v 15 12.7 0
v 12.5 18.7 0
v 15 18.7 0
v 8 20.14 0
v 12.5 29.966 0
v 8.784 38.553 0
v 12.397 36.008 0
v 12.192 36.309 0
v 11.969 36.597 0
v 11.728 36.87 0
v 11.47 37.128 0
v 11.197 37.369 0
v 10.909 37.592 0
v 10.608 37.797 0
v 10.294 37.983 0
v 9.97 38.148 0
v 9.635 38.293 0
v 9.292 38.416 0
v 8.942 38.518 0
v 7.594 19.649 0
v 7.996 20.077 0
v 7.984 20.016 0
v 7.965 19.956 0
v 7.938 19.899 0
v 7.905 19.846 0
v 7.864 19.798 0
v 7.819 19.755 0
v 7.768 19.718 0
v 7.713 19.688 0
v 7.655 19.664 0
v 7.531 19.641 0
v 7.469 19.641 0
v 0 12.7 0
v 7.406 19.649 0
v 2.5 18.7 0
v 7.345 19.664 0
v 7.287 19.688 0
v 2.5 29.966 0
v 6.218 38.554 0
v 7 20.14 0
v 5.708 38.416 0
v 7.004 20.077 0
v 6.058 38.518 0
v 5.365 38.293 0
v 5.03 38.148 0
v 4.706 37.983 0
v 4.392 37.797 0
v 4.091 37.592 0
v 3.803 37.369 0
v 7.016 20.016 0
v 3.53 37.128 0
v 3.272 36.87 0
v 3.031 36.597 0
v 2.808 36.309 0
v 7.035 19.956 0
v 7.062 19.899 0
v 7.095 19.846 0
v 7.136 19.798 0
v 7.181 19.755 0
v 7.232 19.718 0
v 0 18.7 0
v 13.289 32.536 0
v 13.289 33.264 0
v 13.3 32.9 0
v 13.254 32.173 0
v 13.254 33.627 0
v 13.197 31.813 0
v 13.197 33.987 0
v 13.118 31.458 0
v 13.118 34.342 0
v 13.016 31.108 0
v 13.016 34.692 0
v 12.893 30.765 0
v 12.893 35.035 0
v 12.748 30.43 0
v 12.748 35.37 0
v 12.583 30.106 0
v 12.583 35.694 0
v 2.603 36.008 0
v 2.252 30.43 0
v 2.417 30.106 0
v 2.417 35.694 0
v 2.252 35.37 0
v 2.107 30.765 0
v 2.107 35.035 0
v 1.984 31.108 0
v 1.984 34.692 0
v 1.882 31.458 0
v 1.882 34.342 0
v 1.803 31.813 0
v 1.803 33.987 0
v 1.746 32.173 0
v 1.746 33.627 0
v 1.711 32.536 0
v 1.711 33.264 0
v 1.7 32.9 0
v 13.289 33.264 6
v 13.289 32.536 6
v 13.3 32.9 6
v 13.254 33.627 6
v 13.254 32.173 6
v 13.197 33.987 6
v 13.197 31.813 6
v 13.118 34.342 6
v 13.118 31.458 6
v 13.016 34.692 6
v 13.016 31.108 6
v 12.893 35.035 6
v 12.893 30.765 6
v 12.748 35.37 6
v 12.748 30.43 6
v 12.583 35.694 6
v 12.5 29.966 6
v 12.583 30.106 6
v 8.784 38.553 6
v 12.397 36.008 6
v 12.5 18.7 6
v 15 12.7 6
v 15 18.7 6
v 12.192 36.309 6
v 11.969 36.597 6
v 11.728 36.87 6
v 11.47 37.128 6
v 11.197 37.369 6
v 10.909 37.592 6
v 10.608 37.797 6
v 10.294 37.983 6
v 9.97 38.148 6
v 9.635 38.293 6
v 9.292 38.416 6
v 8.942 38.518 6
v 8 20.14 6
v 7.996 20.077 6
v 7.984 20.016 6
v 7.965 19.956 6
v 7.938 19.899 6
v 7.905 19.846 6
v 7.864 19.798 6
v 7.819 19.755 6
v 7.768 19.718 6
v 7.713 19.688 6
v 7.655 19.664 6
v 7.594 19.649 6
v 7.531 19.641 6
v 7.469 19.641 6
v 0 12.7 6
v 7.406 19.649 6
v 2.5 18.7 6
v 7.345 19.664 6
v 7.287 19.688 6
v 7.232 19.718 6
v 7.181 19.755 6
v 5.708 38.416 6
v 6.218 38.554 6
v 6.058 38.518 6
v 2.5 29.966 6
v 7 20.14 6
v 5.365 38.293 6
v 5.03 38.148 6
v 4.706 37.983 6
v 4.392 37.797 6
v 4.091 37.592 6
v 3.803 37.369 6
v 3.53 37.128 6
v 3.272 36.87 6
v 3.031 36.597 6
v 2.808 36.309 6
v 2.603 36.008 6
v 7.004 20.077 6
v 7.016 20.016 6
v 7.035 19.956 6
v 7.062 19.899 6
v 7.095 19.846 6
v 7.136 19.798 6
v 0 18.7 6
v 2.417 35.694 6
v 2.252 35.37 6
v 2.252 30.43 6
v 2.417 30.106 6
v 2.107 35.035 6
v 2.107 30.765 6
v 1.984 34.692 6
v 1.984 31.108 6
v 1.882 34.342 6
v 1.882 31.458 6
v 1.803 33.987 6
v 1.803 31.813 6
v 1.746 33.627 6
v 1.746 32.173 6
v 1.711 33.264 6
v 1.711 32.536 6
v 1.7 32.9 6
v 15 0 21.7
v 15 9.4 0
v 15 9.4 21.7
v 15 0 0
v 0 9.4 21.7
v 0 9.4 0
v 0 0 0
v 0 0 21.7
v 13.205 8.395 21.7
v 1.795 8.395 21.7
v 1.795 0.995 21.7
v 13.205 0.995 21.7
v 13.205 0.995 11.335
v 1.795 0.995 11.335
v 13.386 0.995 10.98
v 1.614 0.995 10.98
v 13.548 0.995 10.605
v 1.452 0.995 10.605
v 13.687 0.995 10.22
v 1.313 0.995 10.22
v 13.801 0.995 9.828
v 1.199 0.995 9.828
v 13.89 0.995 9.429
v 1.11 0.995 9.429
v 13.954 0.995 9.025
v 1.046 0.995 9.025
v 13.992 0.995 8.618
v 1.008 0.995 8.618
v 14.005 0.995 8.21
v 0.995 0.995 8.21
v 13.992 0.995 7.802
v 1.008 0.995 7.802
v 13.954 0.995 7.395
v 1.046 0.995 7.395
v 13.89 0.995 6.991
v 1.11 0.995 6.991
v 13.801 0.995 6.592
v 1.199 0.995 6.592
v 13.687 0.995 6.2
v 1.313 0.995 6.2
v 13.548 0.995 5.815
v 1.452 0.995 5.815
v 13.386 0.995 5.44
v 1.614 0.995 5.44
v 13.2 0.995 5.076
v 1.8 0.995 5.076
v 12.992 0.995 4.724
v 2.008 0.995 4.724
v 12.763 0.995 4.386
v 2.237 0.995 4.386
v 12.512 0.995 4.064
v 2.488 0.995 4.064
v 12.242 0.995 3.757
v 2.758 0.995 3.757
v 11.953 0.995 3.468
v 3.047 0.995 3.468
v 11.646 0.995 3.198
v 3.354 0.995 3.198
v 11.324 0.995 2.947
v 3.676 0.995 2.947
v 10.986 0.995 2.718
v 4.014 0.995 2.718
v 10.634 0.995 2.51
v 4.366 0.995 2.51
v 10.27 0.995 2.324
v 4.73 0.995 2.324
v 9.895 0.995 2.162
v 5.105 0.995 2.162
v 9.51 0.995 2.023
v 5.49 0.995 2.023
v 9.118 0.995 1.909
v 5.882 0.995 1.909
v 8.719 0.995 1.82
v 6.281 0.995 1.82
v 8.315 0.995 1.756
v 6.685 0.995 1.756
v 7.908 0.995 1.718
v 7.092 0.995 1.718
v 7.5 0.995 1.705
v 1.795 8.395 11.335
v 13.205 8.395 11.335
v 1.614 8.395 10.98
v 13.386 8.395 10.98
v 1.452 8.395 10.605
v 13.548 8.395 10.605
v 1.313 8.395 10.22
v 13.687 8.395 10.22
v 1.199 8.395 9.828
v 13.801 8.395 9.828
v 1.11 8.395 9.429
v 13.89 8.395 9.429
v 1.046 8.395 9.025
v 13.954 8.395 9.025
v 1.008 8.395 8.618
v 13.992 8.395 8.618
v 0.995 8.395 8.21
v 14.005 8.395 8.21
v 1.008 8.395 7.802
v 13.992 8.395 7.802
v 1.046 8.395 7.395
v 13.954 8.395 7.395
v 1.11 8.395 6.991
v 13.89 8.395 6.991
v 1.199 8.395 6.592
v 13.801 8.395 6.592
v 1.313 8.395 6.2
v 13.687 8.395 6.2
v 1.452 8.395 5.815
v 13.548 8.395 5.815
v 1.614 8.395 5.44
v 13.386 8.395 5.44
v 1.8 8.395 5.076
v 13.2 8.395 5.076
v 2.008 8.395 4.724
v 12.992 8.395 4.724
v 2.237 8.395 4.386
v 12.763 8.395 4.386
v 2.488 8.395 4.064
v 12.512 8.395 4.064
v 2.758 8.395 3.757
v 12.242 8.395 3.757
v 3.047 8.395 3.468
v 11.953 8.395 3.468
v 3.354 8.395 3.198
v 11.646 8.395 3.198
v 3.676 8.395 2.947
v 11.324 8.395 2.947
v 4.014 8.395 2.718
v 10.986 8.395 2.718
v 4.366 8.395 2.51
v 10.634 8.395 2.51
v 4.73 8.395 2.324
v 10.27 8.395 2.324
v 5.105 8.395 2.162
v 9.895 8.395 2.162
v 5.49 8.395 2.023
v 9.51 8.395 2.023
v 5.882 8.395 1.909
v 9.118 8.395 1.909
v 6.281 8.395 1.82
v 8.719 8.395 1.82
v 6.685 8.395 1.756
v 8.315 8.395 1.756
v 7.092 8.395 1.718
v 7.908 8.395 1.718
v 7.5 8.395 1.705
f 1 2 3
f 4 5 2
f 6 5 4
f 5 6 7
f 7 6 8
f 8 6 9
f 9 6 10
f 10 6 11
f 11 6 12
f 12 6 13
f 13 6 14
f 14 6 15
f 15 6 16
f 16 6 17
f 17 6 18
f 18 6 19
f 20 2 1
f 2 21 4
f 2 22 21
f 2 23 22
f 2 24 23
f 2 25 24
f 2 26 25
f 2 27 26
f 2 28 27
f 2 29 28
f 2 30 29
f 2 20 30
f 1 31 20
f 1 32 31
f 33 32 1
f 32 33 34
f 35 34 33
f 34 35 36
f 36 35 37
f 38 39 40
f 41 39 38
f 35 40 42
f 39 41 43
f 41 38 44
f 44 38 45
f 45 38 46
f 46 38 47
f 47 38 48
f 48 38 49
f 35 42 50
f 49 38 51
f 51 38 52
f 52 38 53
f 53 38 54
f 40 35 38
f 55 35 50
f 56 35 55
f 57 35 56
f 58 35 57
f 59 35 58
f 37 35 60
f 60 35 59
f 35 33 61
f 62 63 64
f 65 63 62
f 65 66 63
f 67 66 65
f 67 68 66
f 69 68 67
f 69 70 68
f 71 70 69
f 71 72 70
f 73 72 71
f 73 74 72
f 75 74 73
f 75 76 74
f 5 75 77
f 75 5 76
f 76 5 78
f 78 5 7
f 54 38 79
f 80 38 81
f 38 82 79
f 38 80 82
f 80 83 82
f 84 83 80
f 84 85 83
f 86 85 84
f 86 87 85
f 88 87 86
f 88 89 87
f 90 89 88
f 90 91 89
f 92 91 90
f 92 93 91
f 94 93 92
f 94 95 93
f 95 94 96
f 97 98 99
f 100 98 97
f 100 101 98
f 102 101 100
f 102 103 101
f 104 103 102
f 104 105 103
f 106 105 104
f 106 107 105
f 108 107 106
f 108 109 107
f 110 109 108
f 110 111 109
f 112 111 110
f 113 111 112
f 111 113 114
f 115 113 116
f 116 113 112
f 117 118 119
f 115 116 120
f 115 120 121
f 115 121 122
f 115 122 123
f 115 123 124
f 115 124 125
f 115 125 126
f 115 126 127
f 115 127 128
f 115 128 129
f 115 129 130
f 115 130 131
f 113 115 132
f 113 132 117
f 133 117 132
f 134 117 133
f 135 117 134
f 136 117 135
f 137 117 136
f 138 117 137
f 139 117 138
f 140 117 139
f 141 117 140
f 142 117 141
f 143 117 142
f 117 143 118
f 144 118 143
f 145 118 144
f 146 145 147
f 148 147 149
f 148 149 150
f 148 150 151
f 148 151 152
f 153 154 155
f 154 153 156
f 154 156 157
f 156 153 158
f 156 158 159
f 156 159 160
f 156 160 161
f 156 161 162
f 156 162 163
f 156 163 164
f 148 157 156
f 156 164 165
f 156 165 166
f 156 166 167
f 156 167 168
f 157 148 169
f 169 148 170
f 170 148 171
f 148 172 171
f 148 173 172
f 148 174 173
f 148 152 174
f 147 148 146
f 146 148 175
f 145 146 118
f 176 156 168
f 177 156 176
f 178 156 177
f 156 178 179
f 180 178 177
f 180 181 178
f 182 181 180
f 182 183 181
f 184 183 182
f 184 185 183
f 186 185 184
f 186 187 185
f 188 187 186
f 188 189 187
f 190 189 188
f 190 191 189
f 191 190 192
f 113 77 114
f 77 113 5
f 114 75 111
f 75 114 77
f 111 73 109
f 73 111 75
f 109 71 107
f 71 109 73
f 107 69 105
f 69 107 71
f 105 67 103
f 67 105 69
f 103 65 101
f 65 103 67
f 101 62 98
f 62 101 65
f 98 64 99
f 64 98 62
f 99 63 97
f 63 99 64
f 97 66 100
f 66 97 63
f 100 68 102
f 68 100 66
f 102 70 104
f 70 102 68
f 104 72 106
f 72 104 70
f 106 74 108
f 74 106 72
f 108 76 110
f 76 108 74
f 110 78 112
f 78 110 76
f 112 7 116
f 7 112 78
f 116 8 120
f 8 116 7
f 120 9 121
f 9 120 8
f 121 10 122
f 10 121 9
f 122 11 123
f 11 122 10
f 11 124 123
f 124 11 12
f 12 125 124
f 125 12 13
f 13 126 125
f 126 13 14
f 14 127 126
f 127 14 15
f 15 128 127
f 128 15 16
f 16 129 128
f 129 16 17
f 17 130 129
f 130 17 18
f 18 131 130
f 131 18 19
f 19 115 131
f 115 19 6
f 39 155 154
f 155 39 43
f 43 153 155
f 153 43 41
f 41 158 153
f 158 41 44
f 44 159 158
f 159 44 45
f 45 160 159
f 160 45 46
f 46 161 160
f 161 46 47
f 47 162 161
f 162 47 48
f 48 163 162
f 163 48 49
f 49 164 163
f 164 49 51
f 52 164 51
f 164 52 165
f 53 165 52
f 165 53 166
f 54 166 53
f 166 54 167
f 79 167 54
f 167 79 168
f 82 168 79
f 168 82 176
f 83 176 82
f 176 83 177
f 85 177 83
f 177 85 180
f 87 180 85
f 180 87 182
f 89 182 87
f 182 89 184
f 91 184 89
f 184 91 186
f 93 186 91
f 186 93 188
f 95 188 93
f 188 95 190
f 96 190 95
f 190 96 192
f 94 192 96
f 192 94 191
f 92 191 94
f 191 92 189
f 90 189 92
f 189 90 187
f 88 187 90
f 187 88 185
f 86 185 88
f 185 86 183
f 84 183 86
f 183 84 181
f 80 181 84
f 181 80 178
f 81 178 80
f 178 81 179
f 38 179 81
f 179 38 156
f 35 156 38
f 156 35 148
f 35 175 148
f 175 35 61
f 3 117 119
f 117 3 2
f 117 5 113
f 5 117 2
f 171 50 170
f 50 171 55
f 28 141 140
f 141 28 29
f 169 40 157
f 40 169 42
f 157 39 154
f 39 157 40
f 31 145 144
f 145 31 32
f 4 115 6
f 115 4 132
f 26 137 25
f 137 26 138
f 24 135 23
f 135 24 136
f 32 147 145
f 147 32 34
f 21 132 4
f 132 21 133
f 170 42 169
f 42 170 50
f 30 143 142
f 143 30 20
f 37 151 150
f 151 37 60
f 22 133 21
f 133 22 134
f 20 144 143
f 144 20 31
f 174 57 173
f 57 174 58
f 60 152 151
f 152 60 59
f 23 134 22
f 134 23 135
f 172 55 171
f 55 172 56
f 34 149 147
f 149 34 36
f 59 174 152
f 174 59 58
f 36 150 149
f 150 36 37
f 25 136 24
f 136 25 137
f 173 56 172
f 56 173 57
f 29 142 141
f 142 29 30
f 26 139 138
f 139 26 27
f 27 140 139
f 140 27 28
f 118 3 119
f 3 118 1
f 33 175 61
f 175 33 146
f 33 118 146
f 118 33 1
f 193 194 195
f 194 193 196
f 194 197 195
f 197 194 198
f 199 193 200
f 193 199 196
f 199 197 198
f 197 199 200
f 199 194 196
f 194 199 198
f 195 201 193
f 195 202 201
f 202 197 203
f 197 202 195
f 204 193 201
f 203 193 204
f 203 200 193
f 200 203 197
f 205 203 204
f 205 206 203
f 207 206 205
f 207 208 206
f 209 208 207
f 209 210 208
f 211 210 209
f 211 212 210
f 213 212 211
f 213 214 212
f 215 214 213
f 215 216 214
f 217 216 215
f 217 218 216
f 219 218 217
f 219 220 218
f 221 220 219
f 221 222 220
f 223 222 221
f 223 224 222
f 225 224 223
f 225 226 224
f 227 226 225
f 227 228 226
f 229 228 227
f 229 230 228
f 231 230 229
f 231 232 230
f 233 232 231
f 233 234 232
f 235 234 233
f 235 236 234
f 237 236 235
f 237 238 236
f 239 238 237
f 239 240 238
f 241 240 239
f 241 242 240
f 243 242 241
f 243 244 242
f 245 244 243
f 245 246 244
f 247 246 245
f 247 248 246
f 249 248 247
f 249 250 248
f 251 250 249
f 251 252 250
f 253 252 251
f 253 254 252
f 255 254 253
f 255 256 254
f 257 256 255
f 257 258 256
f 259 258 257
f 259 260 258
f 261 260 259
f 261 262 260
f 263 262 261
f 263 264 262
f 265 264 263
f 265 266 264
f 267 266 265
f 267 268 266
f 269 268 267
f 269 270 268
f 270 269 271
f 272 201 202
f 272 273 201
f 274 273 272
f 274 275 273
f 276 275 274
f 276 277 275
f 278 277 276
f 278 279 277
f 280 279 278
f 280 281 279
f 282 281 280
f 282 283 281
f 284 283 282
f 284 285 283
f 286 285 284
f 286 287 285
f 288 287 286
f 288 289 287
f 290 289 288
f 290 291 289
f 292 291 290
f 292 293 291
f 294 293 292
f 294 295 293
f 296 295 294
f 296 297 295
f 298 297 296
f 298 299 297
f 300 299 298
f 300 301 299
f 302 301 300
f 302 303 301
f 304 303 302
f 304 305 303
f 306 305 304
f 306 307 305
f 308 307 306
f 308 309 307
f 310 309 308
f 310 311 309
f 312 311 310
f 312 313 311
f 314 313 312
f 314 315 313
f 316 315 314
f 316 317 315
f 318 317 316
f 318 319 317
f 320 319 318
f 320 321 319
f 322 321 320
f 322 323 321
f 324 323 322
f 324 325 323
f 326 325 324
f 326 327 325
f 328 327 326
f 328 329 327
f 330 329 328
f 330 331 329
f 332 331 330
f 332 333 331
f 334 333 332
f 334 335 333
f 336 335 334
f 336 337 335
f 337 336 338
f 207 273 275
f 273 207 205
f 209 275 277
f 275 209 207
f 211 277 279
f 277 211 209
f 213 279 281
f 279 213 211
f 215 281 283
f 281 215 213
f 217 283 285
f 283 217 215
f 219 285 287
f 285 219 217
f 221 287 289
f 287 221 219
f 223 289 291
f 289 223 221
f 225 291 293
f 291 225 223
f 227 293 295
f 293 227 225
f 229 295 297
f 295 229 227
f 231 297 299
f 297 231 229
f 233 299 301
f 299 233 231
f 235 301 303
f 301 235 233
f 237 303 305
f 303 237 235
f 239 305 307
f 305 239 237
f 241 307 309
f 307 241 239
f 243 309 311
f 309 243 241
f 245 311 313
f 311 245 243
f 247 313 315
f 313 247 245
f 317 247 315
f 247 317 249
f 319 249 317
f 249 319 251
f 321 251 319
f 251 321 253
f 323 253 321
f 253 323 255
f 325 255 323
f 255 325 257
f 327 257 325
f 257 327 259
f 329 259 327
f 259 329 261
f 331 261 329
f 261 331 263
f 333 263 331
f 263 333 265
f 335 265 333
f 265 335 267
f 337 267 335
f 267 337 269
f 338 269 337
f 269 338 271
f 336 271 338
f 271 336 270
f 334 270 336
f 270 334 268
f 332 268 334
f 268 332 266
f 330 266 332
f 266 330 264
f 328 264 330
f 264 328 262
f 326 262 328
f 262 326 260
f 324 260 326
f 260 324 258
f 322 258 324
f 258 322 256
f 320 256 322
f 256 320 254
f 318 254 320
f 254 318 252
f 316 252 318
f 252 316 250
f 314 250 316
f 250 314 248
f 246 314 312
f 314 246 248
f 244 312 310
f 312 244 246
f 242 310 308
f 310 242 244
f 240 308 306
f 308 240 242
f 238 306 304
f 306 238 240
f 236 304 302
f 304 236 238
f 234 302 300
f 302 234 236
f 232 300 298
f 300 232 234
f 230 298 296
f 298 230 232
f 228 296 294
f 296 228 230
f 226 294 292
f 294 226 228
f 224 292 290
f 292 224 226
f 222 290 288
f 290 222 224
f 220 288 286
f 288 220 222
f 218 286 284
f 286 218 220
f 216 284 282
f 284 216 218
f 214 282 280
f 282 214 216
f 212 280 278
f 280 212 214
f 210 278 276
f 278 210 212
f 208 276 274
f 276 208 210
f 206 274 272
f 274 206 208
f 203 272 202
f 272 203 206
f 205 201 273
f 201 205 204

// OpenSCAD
// parametrized pin and block connectors
// v0.0.1 2016oct10, ls  initial version
// v0.0.2 2016oct10, ls  changing slot against wedge should increase stability
// v0.0.3 2016oct11, ls  wall parameter refers to real wall strength now. Neglected to 
//                       consider slack in earlier versions.
// v0.0.4 2016oct11, ls  made object height a seperate configuration item. Changed demo placement.

// ------ demonstration and test ------
//  remove for library inclusion

// of tongues plus bulge, but without optional "handle"
length = 20;						// [10:100]
// measured at tongues without bulge
width = 10;						// [4:24]
// or "thickness"
height = 6;						// [2:0.1:20]
// increases sizes of block where pin parts fit in
slack = 0.7;						// [0.2:0.1:2]
// size of block walls at flat sides of pin. also, remaining size at seat of bulge
wall = 1;						// [0.2:0.1:8]
// determines how much bulge protrudes over width
bulge = 0.8;						// [0.2:0.1:4]
// changes slot width and recess to modulate forces for connecting and holding
tension = 3.2;    					// [3:0.1:4]

spacing = 0+5;						// for item positioning 
over  = wall+slack+bulge;
outer = over+width+over;

translate([0, height+wall+slack+spacing, 0])  {
   cube([outer, height, height]);			// optional "handle"
   translate([over, height, 0])
   pin  (length, width, height, bulge, tension);
}

block(length, width, height, bulge, wall, slack);

// ------------------------------------

little = 0+0.01;					// improve preview quality

module wedge(length, width, height)  {
   linear_extrude(height)  {
      hull()  {
         circle(0.5, $fn=50);
         for (i=[-2,2])
         translate([width/i, length])
         circle(little);
      }
   }
}

module pin_and_block(len, width, height, bulge, slack)  {
   radius = min(width/2+bulge+slack, length/2);
   echo(radius);
   linear_extrude(height+2*slack) {  
      union()  {
         square([width+slack*2, len-radius]);
         translate([width/2+slack, len-radius])
         circle(radius, $fn=100);
      }
   }
}

module pin(len, width, height, bulge, tension) {
   radius = width/2+bulge;
   difference()  {
      pin_and_block(len, width, height, bulge, 0);
      translate([width/2, len-tension*radius, -little/2])
      wedge(tension*radius, tension*bulge, height+little);
   }
}


module block(len, width, height, bulge, wall, slack) {
   w = wall+slack;
   l = len+w;
   translate([0, 0, l])
   rotate([270, 0, 0])
   difference()  {
      cube([width+2*(bulge+w), l, height+2*w]);
      translate([bulge+wall-little/2, -little/2, wall-little/2])
      pin_and_block(len, width+little, height, bulge, slack);
   }
}
